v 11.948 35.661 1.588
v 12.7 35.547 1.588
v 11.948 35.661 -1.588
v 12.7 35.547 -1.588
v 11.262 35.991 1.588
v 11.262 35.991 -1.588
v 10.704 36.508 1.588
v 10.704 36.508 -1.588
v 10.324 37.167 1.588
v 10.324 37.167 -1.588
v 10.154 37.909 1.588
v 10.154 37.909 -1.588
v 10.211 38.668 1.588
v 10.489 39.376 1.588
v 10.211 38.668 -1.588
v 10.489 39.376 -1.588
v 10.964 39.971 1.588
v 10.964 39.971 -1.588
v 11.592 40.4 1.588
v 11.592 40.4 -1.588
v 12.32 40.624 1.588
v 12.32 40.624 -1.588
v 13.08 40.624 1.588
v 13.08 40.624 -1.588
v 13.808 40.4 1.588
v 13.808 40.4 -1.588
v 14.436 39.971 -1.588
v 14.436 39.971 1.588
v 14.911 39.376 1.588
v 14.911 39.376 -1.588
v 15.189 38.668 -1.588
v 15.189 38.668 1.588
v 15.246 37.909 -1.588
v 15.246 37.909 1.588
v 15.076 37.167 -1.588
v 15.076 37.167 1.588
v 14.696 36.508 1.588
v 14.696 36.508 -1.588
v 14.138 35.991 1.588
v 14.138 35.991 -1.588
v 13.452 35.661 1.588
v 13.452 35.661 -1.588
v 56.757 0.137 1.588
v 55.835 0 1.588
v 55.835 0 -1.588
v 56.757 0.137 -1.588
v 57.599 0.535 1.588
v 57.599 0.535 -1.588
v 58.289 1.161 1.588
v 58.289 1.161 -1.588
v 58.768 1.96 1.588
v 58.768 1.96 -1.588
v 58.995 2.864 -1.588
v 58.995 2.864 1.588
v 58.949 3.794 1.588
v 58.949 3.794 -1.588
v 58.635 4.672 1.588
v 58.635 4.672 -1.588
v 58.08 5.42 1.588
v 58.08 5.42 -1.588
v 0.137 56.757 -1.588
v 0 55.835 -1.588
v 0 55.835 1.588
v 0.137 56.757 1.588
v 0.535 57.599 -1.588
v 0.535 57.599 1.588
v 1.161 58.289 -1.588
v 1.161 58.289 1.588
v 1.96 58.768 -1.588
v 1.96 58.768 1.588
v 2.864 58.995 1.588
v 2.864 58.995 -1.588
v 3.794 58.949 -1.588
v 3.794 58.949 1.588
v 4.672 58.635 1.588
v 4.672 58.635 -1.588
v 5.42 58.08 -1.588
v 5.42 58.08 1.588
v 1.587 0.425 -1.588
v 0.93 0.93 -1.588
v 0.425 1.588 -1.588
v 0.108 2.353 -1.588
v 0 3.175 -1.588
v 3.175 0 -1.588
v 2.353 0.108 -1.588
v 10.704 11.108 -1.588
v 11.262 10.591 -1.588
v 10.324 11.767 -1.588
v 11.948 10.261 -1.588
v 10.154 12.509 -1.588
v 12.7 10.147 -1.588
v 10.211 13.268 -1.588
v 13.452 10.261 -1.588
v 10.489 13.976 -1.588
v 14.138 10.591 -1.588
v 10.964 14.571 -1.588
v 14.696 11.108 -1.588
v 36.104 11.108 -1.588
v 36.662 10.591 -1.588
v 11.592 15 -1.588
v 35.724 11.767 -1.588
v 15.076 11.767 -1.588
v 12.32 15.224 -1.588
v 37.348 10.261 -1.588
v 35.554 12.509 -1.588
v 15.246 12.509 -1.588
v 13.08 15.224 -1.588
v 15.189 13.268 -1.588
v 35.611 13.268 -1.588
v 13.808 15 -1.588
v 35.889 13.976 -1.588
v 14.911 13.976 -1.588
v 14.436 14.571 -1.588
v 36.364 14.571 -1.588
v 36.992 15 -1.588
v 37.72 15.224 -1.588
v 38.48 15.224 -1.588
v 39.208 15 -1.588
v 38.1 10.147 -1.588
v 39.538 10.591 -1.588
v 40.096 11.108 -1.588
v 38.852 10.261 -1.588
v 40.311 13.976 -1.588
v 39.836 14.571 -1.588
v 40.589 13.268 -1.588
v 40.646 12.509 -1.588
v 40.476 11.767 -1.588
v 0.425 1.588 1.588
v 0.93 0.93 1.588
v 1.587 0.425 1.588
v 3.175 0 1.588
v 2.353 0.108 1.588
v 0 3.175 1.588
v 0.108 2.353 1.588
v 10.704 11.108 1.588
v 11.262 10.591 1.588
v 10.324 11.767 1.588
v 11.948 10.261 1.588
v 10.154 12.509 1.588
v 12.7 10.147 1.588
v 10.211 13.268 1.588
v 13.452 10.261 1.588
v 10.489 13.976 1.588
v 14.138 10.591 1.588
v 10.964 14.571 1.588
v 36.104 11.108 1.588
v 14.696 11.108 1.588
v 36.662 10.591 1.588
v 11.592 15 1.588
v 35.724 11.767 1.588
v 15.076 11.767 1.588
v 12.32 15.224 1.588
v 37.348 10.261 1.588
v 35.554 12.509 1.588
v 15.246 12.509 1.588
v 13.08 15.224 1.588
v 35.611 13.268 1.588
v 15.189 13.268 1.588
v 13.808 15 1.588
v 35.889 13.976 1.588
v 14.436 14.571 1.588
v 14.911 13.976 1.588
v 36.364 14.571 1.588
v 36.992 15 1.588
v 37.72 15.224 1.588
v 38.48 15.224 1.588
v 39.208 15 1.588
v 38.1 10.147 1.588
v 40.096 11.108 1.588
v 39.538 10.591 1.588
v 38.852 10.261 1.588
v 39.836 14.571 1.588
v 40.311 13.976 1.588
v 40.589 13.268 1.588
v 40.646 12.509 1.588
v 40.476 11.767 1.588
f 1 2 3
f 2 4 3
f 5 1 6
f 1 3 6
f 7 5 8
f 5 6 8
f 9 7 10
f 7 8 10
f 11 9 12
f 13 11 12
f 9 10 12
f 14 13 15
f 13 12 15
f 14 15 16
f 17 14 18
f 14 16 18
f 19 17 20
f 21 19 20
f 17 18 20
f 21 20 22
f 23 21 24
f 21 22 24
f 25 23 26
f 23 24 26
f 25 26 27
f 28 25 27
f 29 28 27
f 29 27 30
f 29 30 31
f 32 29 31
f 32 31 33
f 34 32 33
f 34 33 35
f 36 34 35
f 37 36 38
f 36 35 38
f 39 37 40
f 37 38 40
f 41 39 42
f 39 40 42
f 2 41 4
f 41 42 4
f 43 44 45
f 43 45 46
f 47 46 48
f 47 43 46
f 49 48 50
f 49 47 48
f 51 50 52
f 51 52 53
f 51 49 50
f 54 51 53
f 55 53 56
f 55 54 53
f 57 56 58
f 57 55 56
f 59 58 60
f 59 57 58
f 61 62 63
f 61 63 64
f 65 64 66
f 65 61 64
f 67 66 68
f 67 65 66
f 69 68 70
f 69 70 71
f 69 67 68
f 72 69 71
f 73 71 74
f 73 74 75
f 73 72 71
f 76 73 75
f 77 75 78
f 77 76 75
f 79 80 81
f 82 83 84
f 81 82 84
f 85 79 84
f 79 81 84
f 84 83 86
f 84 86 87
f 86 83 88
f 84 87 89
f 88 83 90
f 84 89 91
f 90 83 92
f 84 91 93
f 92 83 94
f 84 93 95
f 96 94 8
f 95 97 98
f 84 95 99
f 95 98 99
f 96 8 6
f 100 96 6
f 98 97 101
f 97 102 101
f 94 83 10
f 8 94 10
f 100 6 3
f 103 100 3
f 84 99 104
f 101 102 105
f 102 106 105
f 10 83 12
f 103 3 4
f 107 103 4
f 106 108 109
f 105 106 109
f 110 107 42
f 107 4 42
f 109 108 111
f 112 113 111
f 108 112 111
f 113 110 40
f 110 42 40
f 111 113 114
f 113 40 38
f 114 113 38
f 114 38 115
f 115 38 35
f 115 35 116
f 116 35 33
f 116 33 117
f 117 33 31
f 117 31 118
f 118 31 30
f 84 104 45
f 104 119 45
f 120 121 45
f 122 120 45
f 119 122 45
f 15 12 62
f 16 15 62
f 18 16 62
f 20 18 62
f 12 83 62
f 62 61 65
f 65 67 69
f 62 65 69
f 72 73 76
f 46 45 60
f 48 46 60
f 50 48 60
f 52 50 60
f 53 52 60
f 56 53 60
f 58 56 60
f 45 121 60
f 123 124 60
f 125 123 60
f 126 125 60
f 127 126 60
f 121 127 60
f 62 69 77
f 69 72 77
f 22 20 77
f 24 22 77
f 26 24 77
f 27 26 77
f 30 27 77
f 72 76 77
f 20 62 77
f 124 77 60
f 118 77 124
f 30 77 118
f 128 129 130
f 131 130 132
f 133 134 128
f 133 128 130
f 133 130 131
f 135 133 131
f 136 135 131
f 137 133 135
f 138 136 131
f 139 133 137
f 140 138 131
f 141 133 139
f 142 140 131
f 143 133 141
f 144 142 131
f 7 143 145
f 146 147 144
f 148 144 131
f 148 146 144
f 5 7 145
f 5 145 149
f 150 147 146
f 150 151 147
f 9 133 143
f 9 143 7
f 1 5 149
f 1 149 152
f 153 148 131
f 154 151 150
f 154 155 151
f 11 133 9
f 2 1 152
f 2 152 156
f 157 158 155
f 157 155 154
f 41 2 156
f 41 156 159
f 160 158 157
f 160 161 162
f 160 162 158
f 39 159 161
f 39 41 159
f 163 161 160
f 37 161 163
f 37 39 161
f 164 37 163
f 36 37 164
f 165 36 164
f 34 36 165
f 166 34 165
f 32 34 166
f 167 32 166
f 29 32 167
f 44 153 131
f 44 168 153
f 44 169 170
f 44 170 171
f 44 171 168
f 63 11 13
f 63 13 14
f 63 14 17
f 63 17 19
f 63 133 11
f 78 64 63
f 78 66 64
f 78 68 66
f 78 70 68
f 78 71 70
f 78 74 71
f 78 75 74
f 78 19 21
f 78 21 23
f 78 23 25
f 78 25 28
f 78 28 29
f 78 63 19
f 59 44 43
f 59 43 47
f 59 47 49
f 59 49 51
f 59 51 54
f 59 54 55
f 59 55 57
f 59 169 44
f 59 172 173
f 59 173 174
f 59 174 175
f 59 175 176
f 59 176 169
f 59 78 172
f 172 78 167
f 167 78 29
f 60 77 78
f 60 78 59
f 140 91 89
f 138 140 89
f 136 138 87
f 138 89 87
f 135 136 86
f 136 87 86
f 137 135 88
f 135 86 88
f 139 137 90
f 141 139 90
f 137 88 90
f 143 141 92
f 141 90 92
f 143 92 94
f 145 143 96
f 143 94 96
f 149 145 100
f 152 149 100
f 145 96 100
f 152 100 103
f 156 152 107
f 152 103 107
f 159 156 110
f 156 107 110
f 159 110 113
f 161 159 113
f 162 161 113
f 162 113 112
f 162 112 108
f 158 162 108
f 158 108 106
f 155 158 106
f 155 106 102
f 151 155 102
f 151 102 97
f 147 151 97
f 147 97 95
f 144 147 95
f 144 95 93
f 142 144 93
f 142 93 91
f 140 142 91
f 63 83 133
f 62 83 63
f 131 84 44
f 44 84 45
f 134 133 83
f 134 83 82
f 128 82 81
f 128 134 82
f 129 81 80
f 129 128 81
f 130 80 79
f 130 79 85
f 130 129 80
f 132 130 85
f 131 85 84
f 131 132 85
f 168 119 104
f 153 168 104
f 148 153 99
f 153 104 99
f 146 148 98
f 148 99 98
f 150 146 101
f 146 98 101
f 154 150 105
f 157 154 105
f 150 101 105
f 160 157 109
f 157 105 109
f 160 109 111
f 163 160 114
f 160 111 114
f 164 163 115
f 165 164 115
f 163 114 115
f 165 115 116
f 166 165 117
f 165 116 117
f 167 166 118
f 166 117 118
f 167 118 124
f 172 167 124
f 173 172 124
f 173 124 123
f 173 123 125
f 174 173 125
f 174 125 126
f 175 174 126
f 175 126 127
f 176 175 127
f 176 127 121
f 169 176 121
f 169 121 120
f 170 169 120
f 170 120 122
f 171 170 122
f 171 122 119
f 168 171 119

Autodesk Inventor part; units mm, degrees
ref_plane "YZ Plane" through (0, 0, 0) normal (1, 0, 0) x (0, 1, 0)
ref_plane "XZ Plane" through (0, 0, 0) normal (0, 1, 0) x (-1, 0, 0)
ref_plane "XY Plane" through (0, 0, 0) normal (0, 0, 1) x (1, 0, 0)
sketch "Sketch1" plane through (0, 0, 0) normal (0, 0, 1) x (1, 0, 0)
  line L0 (0, 0) -> (63.5, 0)
  line L1 (0, 0) -> (0, 63.5)
  line L2 (0, 63.5) -> (63.5, 0)
  dimension "d0" = 63.5
  dimension "d1" = 63.5
extrude "Extrusion1" add sketch "Sketch1" along normal mid plane 3.175
fillet "Fillet1" radius 3.175 3 edges at (0, 63.5, 0) (63.5, 0, 0) (0, 0, 0)
sketch "Sketch2" plane through (0, 0, 1.5875) normal (0, 0, 1) x (1, 0, 0)
  arc A0 (0, 3.175) -> (3.175, 0) centre (3.175, 3.175) ccw construction
  line L0 (0, 3.175) -> (0, 55.8349) construction
  arc A1 (5.4201, 58.0799) -> (0, 55.8349) centre (3.175, 55.8349) ccw construction
  line L1 (5.4201, 58.0799) -> (58.0799, 5.4201) construction
  arc A2 (55.8349, 0) -> (58.0799, 5.4201) centre (55.8349, 3.175) ccw construction
  line L2 (55.8349, 0) -> (3.175, 0) construction
  point P0 (0, 0)
  point P1 (12.7, 12.7)
  dimension "d5" = 12.7
  dimension "d6" = 12.7
hole "Hole1" at (12.7, 12.7, 1.5875) direction (0, 0, -1) diameter 5.1054 end through all clearance for "Flat Head Machine Screw (82)" size "#10" standard "Ansi Unified Screw Threads"
pattern_linear "Rectangular Pattern1" count 2 spacing 25.4 along (1, 0, 0) of "Hole1"
pattern_linear "Rectangular Pattern2" count 2 spacing 25.4 along (0, 1, 0) of "Hole1"
equation "\"d1\" = d0"
properties part number "EL2-C-002" material "Aluminum 6061"
